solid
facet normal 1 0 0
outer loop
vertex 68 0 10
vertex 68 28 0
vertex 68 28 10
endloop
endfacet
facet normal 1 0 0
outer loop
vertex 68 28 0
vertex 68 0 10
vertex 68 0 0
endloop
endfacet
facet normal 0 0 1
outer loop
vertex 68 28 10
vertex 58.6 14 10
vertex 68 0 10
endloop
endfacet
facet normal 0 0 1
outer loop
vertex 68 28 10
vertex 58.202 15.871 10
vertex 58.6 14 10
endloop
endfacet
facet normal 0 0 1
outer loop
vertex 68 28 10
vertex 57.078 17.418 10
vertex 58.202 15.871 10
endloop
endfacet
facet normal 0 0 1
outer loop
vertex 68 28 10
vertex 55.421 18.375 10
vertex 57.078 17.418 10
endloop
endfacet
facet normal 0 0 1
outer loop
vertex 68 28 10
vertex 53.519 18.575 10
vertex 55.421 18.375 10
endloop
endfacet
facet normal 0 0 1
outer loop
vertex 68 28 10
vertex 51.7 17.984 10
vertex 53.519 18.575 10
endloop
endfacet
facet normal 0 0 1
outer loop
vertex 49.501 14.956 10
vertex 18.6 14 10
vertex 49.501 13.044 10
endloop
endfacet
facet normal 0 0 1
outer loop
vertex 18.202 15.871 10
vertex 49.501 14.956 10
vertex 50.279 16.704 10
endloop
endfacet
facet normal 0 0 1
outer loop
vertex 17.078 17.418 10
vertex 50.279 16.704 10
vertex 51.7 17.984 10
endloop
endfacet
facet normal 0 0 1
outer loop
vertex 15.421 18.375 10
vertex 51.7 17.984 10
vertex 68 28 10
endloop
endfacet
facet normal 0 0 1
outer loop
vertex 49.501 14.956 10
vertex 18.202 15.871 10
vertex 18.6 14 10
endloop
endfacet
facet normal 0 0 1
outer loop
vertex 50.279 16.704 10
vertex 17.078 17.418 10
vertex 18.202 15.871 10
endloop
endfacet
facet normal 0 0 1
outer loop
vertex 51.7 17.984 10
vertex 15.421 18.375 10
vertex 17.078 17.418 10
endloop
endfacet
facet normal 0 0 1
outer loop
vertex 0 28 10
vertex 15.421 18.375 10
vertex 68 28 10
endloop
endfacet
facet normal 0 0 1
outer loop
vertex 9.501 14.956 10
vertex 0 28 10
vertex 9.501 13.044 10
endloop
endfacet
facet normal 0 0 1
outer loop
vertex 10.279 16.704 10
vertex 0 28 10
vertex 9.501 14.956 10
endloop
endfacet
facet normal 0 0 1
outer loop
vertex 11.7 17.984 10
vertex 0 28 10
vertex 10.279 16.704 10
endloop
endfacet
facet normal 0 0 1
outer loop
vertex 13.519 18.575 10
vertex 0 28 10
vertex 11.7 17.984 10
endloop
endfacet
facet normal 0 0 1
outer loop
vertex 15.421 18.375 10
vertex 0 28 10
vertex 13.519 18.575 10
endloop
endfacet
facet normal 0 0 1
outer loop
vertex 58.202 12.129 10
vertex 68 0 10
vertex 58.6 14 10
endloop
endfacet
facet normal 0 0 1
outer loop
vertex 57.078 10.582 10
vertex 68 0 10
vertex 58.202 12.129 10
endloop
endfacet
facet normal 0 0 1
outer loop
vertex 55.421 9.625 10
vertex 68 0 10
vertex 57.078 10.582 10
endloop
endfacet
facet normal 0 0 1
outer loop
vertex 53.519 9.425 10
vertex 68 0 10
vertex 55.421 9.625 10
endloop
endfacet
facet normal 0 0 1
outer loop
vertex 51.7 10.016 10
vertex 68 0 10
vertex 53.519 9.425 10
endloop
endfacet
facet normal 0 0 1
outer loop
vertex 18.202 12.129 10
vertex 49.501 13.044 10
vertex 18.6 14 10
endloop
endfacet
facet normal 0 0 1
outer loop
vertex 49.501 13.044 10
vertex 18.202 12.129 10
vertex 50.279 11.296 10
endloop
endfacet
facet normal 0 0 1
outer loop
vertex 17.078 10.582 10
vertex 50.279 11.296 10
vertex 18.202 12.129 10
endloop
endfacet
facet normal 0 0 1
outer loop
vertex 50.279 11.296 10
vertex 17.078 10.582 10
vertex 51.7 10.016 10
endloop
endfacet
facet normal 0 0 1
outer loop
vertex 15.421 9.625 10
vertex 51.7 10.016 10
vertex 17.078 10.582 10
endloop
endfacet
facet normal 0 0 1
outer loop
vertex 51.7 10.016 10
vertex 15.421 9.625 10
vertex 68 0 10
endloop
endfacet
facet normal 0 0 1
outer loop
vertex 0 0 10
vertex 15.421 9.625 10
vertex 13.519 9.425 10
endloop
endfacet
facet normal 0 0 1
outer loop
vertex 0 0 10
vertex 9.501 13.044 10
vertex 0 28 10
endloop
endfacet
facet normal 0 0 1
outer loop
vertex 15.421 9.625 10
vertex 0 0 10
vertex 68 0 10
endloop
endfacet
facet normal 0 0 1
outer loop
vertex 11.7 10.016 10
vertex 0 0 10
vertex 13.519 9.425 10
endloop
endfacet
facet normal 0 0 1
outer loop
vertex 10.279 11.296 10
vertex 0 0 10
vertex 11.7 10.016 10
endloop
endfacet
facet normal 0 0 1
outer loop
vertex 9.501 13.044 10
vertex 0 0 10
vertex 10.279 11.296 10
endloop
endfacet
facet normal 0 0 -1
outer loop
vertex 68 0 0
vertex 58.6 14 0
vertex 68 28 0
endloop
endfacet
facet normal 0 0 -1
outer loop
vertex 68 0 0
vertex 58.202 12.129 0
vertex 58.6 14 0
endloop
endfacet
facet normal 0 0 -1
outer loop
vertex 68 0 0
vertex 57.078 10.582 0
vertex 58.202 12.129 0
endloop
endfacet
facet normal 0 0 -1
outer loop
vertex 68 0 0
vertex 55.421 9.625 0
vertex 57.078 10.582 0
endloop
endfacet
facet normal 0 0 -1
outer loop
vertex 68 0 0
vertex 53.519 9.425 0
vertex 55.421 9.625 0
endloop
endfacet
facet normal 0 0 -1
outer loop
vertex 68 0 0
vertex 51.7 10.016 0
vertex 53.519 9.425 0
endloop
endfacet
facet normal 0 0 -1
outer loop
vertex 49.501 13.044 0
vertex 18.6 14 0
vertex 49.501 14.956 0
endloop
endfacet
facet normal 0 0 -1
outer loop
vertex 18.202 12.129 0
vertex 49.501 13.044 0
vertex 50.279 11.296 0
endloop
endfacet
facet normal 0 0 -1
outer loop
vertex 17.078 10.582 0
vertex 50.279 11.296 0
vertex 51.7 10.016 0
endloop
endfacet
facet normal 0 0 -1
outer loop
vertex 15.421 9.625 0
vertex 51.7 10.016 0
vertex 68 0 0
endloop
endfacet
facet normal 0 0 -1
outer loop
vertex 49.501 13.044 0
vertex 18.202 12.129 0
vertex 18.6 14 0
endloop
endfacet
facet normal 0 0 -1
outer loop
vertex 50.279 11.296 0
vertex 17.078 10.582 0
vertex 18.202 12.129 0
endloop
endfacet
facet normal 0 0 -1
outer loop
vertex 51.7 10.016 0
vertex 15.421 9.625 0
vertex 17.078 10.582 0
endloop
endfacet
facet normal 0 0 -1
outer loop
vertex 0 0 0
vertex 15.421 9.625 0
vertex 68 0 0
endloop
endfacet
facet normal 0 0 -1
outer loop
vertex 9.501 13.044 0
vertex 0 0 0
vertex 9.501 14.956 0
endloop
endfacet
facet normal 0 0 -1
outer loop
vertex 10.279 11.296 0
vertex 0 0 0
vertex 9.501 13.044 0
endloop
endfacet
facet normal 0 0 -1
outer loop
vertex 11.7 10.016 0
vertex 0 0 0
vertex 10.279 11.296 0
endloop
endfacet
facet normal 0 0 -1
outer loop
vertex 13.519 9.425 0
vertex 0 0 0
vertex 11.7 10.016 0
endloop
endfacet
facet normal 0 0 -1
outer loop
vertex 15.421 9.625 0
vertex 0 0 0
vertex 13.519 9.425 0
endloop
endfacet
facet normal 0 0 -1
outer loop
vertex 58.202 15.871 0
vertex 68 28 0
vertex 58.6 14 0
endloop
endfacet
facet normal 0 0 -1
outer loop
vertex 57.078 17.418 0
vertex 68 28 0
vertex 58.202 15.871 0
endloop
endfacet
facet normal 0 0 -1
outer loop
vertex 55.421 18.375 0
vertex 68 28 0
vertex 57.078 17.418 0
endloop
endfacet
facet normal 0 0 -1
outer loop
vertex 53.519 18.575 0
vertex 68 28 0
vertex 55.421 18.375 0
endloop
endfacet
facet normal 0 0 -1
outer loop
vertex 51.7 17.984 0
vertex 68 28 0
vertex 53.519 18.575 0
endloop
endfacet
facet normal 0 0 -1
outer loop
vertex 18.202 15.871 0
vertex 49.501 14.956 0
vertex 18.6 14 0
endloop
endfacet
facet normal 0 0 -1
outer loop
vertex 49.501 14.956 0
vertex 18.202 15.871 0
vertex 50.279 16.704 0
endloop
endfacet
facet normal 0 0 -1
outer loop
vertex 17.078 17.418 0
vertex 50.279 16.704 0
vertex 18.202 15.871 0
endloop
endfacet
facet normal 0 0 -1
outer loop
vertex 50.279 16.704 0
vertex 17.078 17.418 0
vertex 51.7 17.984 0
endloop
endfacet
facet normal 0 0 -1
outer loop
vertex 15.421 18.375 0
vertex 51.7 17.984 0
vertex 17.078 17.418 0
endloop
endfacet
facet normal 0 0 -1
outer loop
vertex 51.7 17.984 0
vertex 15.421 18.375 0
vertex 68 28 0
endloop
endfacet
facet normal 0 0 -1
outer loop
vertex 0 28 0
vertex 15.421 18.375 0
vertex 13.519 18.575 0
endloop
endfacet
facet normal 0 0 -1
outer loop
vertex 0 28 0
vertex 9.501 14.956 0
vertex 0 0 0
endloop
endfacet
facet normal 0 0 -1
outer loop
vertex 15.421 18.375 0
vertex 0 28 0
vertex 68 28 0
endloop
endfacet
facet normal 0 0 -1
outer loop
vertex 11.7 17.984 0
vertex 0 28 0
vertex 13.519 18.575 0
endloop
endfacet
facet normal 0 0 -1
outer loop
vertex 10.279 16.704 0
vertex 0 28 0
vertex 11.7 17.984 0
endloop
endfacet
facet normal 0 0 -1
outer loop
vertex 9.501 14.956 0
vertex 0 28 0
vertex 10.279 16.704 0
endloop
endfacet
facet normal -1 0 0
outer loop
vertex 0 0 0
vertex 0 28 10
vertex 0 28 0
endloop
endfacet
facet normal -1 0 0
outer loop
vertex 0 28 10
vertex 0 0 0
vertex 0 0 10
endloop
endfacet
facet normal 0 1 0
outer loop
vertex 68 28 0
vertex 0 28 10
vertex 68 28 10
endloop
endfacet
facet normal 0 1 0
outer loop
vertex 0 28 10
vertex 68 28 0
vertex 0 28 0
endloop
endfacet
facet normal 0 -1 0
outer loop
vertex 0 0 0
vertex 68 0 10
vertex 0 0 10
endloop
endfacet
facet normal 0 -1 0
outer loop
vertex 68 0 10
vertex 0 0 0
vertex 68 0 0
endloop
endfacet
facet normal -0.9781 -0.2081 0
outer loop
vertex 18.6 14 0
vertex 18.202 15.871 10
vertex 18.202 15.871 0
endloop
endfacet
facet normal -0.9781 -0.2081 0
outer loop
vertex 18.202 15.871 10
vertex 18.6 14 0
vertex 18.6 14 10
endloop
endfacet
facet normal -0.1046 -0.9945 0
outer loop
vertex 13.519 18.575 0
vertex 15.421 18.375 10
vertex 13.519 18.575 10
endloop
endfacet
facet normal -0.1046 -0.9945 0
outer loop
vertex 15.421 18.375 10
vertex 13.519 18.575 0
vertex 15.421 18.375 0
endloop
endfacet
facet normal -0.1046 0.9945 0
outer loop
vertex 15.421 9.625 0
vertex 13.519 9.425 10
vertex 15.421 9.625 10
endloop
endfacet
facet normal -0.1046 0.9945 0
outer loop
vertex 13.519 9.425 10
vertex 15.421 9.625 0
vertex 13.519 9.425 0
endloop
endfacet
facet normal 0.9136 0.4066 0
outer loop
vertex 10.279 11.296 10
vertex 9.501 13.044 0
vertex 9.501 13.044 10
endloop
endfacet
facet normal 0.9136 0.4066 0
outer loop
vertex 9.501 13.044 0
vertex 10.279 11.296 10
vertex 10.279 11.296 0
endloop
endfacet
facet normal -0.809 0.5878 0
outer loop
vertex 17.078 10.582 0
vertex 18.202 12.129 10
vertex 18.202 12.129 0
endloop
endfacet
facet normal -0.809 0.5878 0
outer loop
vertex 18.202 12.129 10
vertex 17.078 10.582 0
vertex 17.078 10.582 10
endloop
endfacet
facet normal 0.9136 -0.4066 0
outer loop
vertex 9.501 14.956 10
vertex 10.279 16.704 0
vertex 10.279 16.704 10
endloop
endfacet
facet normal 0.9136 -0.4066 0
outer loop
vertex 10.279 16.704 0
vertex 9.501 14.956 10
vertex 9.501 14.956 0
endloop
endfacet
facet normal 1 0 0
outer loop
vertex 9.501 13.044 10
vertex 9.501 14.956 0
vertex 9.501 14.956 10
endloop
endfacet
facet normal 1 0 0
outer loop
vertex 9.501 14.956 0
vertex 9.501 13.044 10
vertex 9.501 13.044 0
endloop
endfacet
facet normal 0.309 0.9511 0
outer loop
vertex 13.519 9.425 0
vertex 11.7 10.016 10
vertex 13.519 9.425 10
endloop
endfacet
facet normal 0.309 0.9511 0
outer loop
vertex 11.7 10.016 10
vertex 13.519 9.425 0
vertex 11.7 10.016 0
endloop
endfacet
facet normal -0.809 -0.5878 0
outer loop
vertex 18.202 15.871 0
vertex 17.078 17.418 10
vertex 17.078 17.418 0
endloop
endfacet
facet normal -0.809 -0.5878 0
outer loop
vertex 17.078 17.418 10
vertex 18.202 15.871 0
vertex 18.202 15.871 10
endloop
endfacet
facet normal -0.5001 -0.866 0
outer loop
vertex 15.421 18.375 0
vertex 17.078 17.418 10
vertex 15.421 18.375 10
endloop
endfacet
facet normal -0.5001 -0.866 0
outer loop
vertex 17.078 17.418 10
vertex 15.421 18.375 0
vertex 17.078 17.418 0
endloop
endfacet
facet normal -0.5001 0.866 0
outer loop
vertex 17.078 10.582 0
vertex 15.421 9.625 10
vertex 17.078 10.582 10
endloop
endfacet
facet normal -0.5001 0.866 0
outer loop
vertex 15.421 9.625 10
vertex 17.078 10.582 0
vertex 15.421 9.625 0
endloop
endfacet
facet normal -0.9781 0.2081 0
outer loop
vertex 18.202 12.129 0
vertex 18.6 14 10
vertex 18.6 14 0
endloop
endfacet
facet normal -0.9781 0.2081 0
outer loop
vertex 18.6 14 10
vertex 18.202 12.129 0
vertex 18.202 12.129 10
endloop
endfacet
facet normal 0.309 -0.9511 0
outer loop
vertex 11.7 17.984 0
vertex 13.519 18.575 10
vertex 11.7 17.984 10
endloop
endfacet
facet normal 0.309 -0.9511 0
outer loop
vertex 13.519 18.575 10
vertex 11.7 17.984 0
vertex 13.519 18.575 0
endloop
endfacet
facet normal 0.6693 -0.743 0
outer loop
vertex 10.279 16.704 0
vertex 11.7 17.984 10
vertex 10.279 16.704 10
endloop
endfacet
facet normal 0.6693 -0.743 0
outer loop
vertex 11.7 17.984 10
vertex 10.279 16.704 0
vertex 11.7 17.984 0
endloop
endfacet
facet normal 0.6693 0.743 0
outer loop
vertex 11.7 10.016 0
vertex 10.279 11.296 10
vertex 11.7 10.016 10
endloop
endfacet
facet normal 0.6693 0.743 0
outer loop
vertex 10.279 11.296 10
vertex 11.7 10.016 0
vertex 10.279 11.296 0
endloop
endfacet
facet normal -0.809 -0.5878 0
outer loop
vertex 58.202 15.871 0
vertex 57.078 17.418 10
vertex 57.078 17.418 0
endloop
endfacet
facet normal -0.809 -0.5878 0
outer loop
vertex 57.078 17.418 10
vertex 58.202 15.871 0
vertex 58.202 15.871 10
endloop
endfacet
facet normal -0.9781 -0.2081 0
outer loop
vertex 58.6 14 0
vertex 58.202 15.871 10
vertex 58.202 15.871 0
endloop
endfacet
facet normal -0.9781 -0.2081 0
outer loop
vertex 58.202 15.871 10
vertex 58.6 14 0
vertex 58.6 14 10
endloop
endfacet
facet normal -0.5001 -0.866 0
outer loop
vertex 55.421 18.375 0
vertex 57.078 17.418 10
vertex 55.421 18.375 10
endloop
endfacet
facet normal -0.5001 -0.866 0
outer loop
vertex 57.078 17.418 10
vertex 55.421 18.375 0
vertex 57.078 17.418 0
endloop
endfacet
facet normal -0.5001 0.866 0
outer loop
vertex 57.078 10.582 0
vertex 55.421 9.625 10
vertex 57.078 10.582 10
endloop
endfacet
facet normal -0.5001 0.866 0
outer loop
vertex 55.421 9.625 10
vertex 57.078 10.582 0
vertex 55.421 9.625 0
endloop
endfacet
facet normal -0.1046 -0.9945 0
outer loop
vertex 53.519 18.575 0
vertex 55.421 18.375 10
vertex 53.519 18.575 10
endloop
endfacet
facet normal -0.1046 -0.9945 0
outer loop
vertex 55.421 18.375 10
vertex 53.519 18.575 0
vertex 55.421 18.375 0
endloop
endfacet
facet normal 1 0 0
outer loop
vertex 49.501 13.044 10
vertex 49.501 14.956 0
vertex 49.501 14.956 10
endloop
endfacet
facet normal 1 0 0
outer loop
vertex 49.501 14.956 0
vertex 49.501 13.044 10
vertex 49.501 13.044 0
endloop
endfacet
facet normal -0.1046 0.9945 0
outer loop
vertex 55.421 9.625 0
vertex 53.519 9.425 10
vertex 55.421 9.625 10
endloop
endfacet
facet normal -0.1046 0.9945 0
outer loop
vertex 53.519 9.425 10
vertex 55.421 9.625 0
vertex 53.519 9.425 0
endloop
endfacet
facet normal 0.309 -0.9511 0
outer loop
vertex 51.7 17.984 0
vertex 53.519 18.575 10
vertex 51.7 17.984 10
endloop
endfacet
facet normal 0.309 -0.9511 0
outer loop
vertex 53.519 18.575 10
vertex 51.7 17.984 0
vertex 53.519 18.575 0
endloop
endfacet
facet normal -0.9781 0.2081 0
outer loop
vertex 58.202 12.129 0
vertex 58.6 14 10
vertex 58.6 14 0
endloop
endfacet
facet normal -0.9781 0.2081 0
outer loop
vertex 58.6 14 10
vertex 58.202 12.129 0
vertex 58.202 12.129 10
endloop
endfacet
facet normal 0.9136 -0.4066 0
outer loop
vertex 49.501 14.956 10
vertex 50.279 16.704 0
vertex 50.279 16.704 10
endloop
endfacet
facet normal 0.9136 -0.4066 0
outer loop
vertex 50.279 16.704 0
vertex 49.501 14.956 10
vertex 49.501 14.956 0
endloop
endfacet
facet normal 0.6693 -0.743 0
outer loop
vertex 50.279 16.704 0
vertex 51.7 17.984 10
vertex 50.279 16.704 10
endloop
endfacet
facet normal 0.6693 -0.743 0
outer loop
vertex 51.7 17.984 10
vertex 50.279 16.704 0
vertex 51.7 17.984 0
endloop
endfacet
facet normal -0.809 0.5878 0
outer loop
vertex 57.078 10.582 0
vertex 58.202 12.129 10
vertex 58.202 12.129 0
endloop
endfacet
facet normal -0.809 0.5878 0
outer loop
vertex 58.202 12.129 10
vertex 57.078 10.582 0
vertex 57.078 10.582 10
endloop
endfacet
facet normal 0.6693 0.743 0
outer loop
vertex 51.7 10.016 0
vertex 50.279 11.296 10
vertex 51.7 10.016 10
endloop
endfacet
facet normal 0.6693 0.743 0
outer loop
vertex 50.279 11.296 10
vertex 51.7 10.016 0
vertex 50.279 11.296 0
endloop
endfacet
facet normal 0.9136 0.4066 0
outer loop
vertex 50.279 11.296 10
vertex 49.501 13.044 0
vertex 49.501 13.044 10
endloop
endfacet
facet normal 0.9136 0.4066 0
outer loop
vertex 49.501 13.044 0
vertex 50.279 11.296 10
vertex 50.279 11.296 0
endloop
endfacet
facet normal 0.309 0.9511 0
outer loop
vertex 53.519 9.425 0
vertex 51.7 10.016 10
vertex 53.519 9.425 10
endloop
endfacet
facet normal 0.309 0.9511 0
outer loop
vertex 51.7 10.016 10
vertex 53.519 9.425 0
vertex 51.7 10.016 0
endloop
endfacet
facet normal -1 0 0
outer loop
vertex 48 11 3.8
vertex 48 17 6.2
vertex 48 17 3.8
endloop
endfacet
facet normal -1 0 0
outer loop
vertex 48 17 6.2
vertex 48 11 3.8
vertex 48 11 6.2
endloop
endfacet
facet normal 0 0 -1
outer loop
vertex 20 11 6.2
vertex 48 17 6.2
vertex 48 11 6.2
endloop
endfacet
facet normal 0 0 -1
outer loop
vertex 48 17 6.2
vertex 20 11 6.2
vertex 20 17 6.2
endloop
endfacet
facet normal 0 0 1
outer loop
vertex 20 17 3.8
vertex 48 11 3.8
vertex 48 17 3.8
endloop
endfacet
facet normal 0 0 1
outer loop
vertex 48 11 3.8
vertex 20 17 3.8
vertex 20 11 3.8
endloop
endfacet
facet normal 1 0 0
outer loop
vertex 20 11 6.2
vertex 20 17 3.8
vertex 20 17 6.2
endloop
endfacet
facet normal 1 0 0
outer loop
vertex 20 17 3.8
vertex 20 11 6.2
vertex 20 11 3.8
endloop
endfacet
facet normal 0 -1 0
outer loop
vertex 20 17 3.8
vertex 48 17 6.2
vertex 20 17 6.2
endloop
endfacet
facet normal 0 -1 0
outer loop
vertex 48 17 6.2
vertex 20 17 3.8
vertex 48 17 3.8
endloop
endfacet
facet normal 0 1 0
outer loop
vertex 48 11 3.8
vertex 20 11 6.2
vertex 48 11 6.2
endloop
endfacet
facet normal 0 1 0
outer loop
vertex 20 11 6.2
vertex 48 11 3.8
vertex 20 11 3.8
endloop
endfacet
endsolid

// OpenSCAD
module carriage() {
  w = 68.0; h = 28.0; t = 10.0;
  rod_clear = 9.2; rod_spacing = 40.0;
  belt_w = 6.0; belt_slot_h = 2.4;
  difference() {
    cube([w, h, t], center=false);
    // rod bores
    translate([w/2 - rod_spacing/2, h/2, -1]) cylinder(h=t+2, d=rod_clear, center=false);
    translate([w/2 + rod_spacing/2, h/2, -1]) cylinder(h=t+2, d=rod_clear, center=false);
    // belt slot
    translate([w/2 - 14, h/2 - belt_w/2, t/2 - belt_slot_h/2]) cube([28, belt_w, belt_slot_h], center=false);
  }
}
carriage();
